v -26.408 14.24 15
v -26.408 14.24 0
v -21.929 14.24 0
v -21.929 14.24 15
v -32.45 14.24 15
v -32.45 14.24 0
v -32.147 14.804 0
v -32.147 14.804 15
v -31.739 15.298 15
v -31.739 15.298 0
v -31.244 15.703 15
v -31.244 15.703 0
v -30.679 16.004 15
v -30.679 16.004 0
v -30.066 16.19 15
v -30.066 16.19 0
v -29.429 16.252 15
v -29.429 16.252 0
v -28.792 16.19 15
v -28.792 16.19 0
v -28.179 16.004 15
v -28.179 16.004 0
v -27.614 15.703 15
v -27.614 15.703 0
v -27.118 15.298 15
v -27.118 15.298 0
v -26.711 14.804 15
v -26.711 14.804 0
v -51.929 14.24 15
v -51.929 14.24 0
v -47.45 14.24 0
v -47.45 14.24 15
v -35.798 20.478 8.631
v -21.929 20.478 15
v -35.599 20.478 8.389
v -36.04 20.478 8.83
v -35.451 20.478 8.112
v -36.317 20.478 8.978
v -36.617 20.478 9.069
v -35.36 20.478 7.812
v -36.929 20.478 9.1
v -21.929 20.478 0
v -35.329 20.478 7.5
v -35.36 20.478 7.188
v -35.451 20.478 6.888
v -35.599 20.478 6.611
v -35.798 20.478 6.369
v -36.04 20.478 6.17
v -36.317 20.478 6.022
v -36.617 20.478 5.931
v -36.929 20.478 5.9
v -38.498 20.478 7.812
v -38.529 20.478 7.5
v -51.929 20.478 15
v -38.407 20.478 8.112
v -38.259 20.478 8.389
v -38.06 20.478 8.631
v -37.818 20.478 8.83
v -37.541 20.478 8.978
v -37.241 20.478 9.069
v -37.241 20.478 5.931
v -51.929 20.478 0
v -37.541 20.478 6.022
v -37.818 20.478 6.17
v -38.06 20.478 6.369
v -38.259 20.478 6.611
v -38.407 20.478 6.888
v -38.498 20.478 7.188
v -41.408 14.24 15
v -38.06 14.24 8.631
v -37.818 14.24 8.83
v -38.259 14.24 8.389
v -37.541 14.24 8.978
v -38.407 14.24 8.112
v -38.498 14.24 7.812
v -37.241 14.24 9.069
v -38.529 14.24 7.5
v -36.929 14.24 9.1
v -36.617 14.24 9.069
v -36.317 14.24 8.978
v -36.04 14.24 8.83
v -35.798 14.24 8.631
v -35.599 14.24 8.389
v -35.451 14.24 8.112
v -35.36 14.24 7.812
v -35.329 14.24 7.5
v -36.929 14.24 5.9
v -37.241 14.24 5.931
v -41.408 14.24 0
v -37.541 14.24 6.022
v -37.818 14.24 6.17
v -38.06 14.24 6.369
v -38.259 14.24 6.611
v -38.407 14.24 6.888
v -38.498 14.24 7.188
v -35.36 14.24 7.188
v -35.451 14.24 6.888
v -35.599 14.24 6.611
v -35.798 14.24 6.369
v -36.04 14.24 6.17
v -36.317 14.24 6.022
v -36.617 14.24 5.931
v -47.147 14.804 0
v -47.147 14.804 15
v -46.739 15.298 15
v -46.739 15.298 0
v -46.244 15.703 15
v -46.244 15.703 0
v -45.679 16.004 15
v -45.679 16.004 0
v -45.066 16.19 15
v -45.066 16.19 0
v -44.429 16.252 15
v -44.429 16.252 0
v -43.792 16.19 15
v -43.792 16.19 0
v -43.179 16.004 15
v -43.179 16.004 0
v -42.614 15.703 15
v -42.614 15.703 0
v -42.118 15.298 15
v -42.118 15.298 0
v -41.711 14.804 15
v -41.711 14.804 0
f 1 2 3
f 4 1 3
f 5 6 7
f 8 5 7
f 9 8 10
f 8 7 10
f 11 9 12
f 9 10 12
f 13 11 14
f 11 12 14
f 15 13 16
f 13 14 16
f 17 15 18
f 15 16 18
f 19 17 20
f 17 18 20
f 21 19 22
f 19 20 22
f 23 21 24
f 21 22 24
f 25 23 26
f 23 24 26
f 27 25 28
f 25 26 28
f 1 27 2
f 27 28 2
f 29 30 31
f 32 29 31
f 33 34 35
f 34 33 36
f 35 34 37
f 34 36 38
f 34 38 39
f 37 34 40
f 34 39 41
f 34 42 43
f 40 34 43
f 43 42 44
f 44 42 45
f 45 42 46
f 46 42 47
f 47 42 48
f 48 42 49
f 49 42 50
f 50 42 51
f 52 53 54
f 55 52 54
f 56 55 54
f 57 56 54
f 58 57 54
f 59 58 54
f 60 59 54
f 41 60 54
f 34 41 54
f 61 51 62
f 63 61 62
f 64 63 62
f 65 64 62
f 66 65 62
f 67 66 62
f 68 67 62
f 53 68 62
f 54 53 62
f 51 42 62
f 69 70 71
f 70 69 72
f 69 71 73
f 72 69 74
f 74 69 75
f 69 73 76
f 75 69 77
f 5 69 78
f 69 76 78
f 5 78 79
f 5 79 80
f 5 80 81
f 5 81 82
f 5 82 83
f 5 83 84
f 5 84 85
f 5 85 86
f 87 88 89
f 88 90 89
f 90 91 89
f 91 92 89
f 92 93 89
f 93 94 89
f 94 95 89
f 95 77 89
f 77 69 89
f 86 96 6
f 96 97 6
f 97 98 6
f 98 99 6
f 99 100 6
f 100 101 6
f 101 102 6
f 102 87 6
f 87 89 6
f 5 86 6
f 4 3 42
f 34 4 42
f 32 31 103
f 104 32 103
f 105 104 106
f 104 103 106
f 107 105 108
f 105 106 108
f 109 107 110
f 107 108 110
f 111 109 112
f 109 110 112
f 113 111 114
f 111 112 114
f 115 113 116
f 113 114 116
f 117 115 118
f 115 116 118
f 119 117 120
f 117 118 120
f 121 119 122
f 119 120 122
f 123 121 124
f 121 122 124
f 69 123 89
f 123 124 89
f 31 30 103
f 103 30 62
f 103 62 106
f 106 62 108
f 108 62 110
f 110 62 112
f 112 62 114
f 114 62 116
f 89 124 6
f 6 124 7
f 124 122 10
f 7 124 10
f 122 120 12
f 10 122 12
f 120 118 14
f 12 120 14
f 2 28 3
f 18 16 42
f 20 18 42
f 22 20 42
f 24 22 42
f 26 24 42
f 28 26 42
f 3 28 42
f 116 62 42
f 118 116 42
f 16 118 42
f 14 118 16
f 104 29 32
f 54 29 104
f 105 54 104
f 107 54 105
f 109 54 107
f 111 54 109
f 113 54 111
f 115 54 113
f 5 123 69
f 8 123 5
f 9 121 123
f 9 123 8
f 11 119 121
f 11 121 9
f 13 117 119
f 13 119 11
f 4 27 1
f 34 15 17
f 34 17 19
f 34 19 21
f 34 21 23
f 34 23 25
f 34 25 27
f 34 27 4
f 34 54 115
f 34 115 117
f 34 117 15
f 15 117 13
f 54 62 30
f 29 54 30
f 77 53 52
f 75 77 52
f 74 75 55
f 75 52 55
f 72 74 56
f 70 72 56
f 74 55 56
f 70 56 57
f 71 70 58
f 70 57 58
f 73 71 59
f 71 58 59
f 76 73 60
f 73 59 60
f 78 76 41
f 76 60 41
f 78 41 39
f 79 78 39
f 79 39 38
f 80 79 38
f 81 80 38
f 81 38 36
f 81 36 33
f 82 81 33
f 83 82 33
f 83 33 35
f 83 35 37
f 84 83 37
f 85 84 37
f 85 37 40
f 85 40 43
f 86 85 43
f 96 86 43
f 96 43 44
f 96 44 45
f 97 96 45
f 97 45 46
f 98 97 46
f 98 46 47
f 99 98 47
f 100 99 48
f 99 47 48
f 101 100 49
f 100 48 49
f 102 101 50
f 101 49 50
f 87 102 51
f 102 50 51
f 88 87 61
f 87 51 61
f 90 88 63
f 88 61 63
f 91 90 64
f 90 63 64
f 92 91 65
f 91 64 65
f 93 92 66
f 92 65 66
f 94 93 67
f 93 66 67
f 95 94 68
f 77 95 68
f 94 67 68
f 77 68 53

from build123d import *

# Parameters (mm, degrees)
F1_DEPTH = 15
F2_R     = 1.6
F3_DEPTH = 7


with BuildPart() as f1:
    # F0 (on Top) → F1 (new body)
    with BuildSketch(Plane.XY):
        with BuildLine():
            Line((-21.92891, 20.478352), (-51.92891, 20.478352))
            Line((-51.92891, 20.478352), (-51.92891, 14.23985))
            Line((-51.92891, 14.23985), (-47.449946, 14.23985))
            ThreePointArc((-47.449946, 14.23985), (-44.42891, 16.252193), (-41.407874, 14.23985))
            Line((-41.407874, 14.23985), (-32.449946, 14.23985))
            ThreePointArc((-32.449946, 14.23985), (-29.42891, 16.252193), (-26.407874, 14.23985))
            Line((-26.407874, 14.23985), (-21.92891, 14.23985))
            Line((-21.92891, 14.23985), (-21.92891, 20.478352))
        make_face()
    extrude(amount=F1_DEPTH)

    # F2 (on face) → F3 (cut)
    with BuildSketch(Plane(origin=(0, 20.478352, 0), x_dir=(-1, 0, 0), z_dir=(0, 1, 0))):
        with Locations((36.92891, 7.5)):
            Circle(F2_R)
    extrude(amount=-F3_DEPTH, mode=Mode.SUBTRACT)


solid = f1.part
